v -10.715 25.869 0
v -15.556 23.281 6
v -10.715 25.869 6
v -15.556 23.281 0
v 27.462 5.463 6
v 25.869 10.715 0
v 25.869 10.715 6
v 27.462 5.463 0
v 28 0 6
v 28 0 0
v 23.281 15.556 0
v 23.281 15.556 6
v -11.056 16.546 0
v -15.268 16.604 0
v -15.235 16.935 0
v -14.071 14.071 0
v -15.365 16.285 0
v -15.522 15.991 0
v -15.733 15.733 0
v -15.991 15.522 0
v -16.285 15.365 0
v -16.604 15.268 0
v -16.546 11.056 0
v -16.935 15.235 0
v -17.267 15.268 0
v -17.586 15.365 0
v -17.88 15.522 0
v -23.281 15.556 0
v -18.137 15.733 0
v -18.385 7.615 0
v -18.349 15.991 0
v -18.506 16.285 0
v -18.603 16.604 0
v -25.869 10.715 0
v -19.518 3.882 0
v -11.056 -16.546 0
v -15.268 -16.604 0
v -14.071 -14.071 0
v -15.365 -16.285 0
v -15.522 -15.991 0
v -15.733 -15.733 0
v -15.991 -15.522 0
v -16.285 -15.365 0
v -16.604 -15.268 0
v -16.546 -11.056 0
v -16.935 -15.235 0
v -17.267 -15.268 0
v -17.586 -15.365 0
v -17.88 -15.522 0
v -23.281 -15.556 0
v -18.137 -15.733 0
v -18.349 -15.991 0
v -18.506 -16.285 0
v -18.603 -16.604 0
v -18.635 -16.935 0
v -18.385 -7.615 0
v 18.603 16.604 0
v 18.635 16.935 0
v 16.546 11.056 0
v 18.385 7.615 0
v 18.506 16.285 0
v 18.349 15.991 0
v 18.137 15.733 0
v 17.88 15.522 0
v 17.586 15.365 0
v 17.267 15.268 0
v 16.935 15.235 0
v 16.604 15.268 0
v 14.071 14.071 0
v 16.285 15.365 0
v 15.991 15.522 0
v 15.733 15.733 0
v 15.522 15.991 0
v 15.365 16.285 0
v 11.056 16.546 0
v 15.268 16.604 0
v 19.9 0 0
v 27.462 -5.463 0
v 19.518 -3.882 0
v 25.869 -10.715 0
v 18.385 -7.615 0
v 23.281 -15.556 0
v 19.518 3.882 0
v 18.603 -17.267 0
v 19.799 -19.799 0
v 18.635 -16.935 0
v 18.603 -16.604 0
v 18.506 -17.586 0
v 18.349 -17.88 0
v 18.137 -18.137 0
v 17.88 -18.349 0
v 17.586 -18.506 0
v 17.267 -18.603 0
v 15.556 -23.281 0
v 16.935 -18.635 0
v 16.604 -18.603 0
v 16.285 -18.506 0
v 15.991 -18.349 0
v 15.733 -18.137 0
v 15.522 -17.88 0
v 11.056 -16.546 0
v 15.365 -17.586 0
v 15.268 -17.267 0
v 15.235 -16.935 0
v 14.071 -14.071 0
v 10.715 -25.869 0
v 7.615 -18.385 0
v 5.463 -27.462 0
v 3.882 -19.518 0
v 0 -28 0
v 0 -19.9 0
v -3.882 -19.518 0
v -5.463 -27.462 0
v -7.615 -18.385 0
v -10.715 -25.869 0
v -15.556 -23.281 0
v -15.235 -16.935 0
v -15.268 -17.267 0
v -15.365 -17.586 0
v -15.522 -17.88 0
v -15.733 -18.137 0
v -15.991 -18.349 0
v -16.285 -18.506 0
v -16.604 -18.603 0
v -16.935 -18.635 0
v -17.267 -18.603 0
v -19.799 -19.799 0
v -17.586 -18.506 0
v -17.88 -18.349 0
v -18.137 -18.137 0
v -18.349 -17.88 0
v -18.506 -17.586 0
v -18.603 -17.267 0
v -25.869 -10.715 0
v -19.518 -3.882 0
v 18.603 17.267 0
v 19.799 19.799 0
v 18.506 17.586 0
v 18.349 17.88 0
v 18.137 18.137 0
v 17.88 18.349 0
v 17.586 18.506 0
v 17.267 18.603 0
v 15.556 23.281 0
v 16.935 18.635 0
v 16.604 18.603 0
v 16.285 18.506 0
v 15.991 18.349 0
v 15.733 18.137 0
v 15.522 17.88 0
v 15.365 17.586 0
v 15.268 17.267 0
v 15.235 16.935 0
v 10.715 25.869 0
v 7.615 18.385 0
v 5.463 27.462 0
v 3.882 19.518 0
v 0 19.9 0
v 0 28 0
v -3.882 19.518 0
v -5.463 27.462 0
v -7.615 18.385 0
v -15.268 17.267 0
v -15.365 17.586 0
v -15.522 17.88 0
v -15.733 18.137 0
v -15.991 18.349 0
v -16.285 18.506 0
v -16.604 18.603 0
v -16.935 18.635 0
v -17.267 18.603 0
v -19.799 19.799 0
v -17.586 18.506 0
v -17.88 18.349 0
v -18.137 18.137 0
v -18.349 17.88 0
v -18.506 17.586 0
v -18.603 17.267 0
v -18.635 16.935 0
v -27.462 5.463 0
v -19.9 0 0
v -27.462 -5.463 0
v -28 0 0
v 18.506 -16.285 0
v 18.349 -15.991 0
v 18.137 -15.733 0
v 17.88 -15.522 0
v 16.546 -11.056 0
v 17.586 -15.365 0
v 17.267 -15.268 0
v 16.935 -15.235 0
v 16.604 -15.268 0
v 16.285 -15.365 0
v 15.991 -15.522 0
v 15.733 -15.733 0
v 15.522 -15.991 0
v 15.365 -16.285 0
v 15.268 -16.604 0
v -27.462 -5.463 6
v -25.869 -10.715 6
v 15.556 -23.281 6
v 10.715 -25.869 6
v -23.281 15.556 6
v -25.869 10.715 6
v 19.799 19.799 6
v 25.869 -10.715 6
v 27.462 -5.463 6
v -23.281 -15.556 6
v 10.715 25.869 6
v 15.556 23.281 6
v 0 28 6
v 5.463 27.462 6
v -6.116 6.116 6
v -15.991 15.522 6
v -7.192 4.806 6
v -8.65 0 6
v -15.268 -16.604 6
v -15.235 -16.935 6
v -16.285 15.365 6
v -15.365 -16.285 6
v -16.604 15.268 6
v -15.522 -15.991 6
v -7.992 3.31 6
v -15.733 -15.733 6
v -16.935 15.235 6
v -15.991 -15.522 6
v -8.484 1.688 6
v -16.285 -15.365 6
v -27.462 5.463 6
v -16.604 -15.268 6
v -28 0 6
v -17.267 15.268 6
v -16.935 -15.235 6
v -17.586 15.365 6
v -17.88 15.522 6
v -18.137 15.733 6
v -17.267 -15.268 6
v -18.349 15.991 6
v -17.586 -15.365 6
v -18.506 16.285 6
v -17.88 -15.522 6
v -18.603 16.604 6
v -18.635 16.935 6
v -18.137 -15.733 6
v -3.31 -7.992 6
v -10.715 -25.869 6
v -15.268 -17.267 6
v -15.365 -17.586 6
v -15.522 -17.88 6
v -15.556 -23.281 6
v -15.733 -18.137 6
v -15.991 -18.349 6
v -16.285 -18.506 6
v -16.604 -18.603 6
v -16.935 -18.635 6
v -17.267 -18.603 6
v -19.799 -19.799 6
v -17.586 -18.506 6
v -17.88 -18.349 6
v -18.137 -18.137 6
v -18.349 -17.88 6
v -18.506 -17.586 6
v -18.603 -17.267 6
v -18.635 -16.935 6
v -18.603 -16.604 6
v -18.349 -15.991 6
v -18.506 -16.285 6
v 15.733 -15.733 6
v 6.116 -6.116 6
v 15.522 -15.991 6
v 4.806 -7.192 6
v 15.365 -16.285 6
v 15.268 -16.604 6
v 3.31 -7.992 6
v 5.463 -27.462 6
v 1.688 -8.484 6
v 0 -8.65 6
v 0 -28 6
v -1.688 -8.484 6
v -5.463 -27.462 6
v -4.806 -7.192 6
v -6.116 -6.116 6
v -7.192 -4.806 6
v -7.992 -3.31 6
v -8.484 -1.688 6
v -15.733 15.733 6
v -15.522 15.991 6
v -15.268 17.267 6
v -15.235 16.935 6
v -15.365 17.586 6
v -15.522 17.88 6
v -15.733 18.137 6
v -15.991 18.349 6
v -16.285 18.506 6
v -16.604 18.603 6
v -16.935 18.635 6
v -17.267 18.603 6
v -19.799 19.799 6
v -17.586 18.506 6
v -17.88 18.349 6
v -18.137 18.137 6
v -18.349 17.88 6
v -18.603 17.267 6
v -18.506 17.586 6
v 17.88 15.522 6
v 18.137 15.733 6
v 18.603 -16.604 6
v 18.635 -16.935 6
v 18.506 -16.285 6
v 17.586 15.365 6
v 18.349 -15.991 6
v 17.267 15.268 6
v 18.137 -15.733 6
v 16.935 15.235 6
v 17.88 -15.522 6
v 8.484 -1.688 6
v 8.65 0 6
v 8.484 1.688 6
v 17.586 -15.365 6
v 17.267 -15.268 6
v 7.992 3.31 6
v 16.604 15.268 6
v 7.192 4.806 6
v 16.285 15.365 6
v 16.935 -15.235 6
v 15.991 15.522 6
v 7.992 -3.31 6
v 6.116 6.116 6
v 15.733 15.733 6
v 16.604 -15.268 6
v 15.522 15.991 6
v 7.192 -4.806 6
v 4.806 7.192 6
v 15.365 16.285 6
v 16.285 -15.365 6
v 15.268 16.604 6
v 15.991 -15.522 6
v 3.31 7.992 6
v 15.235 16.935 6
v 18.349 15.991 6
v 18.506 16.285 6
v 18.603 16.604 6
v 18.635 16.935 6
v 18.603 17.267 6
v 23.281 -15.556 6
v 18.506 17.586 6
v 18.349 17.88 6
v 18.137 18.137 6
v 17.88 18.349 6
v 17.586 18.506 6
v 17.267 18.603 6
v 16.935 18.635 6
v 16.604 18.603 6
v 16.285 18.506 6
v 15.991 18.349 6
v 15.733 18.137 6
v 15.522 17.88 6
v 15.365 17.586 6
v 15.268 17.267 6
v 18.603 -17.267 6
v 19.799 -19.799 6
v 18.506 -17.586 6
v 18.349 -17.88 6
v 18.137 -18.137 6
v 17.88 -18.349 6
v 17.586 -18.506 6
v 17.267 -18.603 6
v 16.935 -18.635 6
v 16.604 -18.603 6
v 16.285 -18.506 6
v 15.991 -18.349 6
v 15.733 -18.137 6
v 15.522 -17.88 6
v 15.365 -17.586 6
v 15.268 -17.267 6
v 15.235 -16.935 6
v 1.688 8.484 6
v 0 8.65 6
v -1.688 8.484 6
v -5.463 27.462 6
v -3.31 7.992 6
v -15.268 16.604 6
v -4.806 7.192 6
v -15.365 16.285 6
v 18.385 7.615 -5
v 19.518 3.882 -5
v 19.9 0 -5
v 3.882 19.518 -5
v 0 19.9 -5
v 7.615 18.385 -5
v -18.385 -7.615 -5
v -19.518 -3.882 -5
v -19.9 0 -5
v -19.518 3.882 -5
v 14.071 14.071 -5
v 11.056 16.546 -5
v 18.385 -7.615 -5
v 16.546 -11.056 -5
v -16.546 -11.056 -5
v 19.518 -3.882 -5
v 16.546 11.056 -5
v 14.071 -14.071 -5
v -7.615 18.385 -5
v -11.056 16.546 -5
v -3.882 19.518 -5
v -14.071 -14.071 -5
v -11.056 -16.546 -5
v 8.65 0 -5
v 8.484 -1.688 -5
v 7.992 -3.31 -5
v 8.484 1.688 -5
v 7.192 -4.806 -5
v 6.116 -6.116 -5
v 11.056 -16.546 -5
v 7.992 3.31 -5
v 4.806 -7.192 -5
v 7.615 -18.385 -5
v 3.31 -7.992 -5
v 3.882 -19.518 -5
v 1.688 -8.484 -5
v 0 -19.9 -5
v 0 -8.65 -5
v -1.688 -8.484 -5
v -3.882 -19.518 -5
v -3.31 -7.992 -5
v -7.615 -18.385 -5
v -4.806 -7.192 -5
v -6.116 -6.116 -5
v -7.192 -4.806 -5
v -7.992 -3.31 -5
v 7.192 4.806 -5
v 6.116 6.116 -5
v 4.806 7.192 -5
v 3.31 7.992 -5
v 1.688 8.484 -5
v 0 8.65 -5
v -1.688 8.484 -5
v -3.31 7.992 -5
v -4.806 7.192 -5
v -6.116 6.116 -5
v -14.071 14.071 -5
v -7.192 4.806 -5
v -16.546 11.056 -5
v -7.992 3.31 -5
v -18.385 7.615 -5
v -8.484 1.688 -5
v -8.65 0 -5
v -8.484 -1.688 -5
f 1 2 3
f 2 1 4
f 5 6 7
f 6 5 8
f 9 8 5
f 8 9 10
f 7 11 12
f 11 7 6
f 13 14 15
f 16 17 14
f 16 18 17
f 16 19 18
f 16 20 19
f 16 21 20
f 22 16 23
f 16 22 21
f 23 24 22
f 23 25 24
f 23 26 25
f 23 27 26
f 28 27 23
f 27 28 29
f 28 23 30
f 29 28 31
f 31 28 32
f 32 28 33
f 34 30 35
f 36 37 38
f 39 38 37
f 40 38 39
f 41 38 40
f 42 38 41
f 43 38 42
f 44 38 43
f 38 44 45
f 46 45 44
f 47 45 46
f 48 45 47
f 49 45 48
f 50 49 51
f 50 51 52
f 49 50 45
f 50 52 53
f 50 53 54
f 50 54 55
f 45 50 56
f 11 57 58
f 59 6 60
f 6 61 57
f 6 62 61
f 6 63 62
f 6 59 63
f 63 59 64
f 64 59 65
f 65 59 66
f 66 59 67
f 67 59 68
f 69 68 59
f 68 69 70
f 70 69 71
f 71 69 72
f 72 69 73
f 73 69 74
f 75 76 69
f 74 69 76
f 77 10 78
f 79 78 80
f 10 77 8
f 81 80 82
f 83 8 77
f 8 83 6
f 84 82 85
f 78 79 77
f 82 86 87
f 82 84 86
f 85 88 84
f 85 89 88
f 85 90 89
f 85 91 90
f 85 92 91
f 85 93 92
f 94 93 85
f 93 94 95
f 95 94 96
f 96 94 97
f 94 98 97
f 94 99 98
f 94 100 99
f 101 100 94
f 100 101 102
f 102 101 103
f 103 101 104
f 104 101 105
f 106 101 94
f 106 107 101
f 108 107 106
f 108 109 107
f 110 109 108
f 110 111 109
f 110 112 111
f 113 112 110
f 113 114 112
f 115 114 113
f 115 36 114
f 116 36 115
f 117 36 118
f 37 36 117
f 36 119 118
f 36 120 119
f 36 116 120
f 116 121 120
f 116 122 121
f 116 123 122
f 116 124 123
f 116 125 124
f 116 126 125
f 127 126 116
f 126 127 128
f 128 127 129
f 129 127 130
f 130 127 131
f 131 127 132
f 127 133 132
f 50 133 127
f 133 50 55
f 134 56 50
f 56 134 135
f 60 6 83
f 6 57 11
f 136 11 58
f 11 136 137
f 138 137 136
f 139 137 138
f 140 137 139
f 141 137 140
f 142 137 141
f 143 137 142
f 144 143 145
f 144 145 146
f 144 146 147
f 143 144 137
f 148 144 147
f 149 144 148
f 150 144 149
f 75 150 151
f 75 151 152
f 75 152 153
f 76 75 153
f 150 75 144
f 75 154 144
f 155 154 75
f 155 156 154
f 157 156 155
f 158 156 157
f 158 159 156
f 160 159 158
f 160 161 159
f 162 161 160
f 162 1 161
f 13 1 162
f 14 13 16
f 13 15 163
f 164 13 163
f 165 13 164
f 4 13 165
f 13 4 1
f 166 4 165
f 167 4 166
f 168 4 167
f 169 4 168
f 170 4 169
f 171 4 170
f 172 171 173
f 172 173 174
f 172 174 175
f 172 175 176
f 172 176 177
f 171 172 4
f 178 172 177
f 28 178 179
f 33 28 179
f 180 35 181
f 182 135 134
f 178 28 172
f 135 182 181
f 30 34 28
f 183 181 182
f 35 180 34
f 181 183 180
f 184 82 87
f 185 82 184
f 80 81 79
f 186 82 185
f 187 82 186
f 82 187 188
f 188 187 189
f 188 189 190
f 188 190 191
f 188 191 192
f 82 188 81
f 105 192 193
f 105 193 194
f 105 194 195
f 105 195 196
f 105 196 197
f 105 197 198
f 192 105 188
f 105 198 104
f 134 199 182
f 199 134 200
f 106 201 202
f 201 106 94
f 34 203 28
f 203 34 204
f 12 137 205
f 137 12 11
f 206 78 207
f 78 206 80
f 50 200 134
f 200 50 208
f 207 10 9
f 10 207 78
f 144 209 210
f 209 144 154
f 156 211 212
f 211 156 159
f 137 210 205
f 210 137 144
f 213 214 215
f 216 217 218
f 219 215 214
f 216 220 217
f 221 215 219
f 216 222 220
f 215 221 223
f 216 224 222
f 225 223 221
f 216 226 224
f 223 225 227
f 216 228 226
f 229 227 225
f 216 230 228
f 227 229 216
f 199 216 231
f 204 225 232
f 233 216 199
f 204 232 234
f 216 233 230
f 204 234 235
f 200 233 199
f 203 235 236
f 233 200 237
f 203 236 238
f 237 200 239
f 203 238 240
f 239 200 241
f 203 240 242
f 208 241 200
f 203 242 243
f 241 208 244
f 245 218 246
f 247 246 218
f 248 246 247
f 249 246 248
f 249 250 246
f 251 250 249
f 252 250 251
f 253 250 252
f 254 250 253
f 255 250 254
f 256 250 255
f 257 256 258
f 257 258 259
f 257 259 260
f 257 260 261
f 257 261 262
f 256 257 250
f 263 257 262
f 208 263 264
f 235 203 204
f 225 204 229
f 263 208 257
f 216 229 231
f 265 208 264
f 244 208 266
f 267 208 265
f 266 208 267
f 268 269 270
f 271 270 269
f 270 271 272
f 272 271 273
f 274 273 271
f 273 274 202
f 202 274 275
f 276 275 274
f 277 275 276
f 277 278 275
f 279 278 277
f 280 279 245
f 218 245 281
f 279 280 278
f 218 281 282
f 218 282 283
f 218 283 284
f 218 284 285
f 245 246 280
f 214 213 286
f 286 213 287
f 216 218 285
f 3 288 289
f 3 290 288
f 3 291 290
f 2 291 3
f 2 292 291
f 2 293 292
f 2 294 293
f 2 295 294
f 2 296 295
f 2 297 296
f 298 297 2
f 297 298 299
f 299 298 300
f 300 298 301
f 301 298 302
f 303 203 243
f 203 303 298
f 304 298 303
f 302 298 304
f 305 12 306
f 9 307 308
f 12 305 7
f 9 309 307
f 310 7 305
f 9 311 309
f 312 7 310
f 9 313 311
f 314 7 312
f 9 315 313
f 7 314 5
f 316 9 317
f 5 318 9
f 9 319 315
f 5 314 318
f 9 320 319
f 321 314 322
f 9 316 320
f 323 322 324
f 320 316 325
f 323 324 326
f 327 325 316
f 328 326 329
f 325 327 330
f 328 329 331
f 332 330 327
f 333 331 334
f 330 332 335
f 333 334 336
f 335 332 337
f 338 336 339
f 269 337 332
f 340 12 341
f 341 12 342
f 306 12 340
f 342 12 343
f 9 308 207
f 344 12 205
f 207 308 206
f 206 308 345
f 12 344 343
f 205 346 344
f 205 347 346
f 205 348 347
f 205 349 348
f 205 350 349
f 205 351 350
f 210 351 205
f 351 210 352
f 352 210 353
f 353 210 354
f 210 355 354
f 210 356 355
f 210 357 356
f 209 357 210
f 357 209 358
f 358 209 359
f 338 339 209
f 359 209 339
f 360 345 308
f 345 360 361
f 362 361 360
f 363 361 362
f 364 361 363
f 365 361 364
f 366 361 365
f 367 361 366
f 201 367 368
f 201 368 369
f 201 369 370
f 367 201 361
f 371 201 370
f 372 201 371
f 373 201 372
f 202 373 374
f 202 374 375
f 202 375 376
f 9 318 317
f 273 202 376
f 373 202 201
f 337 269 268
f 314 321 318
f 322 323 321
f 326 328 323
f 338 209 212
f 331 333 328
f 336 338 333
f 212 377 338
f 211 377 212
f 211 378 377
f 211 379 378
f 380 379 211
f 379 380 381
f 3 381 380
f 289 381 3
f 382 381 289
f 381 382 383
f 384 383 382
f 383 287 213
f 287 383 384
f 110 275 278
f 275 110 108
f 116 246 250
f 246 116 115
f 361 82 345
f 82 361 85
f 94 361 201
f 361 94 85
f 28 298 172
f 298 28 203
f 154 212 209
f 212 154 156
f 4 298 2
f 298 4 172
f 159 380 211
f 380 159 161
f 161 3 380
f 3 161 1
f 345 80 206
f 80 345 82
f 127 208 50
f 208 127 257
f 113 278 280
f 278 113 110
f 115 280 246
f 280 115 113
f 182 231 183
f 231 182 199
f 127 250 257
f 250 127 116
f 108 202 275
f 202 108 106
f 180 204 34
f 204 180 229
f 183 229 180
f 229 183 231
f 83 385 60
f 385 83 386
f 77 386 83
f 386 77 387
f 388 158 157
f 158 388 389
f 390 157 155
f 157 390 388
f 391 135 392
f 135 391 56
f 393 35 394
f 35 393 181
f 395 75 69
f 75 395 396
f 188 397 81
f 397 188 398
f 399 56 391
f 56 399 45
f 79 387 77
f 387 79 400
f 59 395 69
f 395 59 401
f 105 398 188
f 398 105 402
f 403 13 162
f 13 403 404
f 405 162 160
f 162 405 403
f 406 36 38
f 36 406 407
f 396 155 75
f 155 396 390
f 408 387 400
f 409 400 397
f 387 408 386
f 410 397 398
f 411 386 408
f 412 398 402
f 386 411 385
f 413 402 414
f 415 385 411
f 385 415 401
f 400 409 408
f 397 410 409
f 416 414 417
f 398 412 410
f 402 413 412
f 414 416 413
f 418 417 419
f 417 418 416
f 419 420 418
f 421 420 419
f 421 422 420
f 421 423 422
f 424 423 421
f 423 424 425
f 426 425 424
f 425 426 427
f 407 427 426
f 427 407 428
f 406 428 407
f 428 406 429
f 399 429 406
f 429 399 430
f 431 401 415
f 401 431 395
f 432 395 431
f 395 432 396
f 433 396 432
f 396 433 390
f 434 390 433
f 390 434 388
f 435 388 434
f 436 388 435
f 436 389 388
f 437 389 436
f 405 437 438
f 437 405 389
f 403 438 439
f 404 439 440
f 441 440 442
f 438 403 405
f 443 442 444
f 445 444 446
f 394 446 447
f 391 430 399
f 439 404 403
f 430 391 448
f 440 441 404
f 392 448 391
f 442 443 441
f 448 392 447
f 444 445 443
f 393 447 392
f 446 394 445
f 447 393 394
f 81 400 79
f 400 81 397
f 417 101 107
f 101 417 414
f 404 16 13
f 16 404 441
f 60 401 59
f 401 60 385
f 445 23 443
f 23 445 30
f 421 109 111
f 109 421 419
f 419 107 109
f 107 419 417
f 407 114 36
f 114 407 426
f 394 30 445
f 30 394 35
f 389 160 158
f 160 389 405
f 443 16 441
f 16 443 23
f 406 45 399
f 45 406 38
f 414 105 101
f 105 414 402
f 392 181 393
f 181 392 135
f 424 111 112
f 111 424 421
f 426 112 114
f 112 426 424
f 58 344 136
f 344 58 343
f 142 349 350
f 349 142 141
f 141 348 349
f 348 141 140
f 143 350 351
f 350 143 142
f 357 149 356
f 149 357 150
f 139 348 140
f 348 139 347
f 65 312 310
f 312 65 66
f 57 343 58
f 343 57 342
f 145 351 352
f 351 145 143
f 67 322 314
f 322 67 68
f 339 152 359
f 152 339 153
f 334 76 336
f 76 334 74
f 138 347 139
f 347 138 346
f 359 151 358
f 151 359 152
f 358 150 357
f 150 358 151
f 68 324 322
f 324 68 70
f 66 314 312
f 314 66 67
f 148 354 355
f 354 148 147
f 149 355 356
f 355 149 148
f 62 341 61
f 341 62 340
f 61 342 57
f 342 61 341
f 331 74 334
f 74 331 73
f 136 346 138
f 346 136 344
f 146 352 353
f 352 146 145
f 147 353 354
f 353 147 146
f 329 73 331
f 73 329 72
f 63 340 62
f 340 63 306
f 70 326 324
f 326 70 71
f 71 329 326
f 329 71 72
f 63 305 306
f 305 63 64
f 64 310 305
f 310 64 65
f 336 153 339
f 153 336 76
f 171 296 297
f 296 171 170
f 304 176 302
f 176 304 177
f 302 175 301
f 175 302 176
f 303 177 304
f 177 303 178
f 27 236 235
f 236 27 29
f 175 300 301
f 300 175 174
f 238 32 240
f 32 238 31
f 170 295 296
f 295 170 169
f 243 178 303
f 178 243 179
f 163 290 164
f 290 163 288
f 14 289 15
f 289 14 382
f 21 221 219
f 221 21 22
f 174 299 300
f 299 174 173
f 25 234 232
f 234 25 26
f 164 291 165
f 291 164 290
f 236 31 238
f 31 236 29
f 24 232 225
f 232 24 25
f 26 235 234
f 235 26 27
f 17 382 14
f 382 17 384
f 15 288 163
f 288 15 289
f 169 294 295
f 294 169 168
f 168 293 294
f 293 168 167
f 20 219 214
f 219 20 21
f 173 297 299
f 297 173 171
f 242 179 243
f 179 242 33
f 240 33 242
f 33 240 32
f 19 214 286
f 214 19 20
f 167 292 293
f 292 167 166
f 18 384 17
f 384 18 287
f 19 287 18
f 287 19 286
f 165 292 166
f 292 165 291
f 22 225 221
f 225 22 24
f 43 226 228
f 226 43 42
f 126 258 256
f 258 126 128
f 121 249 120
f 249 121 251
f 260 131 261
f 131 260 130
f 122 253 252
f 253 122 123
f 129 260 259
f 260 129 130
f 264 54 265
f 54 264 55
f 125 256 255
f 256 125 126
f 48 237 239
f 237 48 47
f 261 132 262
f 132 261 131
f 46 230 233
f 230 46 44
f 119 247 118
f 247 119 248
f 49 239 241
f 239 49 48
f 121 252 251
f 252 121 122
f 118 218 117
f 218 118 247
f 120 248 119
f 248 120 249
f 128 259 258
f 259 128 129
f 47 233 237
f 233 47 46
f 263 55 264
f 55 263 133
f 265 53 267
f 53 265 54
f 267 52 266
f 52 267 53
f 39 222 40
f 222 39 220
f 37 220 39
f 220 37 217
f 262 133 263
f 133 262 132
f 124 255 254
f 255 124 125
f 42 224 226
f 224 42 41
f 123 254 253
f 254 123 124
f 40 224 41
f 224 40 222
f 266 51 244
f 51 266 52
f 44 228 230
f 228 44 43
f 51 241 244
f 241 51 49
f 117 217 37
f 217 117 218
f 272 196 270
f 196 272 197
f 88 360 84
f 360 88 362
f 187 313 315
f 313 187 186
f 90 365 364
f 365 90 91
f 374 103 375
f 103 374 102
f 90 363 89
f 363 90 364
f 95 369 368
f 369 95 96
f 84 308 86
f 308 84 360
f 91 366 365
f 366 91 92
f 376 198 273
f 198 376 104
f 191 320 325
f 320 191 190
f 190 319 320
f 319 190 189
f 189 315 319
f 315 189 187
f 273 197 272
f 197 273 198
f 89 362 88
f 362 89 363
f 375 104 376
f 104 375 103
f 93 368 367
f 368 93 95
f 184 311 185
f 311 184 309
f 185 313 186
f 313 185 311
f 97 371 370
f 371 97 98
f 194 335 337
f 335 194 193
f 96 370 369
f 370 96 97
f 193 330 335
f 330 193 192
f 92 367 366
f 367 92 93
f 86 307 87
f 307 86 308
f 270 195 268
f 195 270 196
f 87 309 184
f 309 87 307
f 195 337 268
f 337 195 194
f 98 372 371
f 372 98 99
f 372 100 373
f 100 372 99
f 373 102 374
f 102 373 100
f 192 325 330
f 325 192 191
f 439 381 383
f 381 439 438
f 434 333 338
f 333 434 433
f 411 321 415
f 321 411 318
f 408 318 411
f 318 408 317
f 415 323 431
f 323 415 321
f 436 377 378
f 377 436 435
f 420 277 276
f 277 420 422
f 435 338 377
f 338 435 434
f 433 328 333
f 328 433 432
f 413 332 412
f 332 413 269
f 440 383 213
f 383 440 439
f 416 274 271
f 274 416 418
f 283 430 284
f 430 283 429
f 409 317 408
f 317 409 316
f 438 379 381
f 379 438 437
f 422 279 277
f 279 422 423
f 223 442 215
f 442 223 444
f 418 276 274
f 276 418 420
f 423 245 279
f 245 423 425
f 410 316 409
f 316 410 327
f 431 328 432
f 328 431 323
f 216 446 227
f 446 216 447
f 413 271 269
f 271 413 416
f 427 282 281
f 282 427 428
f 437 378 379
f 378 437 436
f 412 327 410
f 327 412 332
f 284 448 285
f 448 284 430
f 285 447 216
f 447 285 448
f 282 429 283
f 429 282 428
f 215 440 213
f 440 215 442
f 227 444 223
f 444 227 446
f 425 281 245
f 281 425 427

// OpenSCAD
$fn = 32;

// ----------------------------------------------------------------------
// Retaining cap: 6203 cover, 56 mm, spigot 39.8 mm
// ----------------------------------------------------------------------

// --- parameters (mm) ---
cover_d = 56;             // cover diameter
cover_t = 6;              // cover thickness
spigot_d = 39.8;          // spigot that enters the housing
spigot_h = 5;             // spigot height
shaft_d = 17.3;           // shaft opening
bolt_d = 3.4;             // bolt clearance
bolt_r = 23.95;           // bolt circle radius

module cover() {
  cylinder(h = cover_t, d = cover_d);
}

module spigot() {
  /* sunk 1 mm into the cover; the spigot sets the overall height */
  translate([0, 0, -spigot_h]) cylinder(h = spigot_h + 1, d = spigot_d);
}

difference() {
  union() {
    cover();
    spigot();
  }
  for (i = [0 : 3]) rotate([0, 0, 45 + i * 90]) translate([bolt_r, 0, -spigot_h - 1])
    cylinder(h = spigot_h + cover_t + 2, d = bolt_d);
  translate([0, 0, -spigot_h - 1]) cylinder(h = spigot_h + cover_t + 2, d = shaft_d);
}
